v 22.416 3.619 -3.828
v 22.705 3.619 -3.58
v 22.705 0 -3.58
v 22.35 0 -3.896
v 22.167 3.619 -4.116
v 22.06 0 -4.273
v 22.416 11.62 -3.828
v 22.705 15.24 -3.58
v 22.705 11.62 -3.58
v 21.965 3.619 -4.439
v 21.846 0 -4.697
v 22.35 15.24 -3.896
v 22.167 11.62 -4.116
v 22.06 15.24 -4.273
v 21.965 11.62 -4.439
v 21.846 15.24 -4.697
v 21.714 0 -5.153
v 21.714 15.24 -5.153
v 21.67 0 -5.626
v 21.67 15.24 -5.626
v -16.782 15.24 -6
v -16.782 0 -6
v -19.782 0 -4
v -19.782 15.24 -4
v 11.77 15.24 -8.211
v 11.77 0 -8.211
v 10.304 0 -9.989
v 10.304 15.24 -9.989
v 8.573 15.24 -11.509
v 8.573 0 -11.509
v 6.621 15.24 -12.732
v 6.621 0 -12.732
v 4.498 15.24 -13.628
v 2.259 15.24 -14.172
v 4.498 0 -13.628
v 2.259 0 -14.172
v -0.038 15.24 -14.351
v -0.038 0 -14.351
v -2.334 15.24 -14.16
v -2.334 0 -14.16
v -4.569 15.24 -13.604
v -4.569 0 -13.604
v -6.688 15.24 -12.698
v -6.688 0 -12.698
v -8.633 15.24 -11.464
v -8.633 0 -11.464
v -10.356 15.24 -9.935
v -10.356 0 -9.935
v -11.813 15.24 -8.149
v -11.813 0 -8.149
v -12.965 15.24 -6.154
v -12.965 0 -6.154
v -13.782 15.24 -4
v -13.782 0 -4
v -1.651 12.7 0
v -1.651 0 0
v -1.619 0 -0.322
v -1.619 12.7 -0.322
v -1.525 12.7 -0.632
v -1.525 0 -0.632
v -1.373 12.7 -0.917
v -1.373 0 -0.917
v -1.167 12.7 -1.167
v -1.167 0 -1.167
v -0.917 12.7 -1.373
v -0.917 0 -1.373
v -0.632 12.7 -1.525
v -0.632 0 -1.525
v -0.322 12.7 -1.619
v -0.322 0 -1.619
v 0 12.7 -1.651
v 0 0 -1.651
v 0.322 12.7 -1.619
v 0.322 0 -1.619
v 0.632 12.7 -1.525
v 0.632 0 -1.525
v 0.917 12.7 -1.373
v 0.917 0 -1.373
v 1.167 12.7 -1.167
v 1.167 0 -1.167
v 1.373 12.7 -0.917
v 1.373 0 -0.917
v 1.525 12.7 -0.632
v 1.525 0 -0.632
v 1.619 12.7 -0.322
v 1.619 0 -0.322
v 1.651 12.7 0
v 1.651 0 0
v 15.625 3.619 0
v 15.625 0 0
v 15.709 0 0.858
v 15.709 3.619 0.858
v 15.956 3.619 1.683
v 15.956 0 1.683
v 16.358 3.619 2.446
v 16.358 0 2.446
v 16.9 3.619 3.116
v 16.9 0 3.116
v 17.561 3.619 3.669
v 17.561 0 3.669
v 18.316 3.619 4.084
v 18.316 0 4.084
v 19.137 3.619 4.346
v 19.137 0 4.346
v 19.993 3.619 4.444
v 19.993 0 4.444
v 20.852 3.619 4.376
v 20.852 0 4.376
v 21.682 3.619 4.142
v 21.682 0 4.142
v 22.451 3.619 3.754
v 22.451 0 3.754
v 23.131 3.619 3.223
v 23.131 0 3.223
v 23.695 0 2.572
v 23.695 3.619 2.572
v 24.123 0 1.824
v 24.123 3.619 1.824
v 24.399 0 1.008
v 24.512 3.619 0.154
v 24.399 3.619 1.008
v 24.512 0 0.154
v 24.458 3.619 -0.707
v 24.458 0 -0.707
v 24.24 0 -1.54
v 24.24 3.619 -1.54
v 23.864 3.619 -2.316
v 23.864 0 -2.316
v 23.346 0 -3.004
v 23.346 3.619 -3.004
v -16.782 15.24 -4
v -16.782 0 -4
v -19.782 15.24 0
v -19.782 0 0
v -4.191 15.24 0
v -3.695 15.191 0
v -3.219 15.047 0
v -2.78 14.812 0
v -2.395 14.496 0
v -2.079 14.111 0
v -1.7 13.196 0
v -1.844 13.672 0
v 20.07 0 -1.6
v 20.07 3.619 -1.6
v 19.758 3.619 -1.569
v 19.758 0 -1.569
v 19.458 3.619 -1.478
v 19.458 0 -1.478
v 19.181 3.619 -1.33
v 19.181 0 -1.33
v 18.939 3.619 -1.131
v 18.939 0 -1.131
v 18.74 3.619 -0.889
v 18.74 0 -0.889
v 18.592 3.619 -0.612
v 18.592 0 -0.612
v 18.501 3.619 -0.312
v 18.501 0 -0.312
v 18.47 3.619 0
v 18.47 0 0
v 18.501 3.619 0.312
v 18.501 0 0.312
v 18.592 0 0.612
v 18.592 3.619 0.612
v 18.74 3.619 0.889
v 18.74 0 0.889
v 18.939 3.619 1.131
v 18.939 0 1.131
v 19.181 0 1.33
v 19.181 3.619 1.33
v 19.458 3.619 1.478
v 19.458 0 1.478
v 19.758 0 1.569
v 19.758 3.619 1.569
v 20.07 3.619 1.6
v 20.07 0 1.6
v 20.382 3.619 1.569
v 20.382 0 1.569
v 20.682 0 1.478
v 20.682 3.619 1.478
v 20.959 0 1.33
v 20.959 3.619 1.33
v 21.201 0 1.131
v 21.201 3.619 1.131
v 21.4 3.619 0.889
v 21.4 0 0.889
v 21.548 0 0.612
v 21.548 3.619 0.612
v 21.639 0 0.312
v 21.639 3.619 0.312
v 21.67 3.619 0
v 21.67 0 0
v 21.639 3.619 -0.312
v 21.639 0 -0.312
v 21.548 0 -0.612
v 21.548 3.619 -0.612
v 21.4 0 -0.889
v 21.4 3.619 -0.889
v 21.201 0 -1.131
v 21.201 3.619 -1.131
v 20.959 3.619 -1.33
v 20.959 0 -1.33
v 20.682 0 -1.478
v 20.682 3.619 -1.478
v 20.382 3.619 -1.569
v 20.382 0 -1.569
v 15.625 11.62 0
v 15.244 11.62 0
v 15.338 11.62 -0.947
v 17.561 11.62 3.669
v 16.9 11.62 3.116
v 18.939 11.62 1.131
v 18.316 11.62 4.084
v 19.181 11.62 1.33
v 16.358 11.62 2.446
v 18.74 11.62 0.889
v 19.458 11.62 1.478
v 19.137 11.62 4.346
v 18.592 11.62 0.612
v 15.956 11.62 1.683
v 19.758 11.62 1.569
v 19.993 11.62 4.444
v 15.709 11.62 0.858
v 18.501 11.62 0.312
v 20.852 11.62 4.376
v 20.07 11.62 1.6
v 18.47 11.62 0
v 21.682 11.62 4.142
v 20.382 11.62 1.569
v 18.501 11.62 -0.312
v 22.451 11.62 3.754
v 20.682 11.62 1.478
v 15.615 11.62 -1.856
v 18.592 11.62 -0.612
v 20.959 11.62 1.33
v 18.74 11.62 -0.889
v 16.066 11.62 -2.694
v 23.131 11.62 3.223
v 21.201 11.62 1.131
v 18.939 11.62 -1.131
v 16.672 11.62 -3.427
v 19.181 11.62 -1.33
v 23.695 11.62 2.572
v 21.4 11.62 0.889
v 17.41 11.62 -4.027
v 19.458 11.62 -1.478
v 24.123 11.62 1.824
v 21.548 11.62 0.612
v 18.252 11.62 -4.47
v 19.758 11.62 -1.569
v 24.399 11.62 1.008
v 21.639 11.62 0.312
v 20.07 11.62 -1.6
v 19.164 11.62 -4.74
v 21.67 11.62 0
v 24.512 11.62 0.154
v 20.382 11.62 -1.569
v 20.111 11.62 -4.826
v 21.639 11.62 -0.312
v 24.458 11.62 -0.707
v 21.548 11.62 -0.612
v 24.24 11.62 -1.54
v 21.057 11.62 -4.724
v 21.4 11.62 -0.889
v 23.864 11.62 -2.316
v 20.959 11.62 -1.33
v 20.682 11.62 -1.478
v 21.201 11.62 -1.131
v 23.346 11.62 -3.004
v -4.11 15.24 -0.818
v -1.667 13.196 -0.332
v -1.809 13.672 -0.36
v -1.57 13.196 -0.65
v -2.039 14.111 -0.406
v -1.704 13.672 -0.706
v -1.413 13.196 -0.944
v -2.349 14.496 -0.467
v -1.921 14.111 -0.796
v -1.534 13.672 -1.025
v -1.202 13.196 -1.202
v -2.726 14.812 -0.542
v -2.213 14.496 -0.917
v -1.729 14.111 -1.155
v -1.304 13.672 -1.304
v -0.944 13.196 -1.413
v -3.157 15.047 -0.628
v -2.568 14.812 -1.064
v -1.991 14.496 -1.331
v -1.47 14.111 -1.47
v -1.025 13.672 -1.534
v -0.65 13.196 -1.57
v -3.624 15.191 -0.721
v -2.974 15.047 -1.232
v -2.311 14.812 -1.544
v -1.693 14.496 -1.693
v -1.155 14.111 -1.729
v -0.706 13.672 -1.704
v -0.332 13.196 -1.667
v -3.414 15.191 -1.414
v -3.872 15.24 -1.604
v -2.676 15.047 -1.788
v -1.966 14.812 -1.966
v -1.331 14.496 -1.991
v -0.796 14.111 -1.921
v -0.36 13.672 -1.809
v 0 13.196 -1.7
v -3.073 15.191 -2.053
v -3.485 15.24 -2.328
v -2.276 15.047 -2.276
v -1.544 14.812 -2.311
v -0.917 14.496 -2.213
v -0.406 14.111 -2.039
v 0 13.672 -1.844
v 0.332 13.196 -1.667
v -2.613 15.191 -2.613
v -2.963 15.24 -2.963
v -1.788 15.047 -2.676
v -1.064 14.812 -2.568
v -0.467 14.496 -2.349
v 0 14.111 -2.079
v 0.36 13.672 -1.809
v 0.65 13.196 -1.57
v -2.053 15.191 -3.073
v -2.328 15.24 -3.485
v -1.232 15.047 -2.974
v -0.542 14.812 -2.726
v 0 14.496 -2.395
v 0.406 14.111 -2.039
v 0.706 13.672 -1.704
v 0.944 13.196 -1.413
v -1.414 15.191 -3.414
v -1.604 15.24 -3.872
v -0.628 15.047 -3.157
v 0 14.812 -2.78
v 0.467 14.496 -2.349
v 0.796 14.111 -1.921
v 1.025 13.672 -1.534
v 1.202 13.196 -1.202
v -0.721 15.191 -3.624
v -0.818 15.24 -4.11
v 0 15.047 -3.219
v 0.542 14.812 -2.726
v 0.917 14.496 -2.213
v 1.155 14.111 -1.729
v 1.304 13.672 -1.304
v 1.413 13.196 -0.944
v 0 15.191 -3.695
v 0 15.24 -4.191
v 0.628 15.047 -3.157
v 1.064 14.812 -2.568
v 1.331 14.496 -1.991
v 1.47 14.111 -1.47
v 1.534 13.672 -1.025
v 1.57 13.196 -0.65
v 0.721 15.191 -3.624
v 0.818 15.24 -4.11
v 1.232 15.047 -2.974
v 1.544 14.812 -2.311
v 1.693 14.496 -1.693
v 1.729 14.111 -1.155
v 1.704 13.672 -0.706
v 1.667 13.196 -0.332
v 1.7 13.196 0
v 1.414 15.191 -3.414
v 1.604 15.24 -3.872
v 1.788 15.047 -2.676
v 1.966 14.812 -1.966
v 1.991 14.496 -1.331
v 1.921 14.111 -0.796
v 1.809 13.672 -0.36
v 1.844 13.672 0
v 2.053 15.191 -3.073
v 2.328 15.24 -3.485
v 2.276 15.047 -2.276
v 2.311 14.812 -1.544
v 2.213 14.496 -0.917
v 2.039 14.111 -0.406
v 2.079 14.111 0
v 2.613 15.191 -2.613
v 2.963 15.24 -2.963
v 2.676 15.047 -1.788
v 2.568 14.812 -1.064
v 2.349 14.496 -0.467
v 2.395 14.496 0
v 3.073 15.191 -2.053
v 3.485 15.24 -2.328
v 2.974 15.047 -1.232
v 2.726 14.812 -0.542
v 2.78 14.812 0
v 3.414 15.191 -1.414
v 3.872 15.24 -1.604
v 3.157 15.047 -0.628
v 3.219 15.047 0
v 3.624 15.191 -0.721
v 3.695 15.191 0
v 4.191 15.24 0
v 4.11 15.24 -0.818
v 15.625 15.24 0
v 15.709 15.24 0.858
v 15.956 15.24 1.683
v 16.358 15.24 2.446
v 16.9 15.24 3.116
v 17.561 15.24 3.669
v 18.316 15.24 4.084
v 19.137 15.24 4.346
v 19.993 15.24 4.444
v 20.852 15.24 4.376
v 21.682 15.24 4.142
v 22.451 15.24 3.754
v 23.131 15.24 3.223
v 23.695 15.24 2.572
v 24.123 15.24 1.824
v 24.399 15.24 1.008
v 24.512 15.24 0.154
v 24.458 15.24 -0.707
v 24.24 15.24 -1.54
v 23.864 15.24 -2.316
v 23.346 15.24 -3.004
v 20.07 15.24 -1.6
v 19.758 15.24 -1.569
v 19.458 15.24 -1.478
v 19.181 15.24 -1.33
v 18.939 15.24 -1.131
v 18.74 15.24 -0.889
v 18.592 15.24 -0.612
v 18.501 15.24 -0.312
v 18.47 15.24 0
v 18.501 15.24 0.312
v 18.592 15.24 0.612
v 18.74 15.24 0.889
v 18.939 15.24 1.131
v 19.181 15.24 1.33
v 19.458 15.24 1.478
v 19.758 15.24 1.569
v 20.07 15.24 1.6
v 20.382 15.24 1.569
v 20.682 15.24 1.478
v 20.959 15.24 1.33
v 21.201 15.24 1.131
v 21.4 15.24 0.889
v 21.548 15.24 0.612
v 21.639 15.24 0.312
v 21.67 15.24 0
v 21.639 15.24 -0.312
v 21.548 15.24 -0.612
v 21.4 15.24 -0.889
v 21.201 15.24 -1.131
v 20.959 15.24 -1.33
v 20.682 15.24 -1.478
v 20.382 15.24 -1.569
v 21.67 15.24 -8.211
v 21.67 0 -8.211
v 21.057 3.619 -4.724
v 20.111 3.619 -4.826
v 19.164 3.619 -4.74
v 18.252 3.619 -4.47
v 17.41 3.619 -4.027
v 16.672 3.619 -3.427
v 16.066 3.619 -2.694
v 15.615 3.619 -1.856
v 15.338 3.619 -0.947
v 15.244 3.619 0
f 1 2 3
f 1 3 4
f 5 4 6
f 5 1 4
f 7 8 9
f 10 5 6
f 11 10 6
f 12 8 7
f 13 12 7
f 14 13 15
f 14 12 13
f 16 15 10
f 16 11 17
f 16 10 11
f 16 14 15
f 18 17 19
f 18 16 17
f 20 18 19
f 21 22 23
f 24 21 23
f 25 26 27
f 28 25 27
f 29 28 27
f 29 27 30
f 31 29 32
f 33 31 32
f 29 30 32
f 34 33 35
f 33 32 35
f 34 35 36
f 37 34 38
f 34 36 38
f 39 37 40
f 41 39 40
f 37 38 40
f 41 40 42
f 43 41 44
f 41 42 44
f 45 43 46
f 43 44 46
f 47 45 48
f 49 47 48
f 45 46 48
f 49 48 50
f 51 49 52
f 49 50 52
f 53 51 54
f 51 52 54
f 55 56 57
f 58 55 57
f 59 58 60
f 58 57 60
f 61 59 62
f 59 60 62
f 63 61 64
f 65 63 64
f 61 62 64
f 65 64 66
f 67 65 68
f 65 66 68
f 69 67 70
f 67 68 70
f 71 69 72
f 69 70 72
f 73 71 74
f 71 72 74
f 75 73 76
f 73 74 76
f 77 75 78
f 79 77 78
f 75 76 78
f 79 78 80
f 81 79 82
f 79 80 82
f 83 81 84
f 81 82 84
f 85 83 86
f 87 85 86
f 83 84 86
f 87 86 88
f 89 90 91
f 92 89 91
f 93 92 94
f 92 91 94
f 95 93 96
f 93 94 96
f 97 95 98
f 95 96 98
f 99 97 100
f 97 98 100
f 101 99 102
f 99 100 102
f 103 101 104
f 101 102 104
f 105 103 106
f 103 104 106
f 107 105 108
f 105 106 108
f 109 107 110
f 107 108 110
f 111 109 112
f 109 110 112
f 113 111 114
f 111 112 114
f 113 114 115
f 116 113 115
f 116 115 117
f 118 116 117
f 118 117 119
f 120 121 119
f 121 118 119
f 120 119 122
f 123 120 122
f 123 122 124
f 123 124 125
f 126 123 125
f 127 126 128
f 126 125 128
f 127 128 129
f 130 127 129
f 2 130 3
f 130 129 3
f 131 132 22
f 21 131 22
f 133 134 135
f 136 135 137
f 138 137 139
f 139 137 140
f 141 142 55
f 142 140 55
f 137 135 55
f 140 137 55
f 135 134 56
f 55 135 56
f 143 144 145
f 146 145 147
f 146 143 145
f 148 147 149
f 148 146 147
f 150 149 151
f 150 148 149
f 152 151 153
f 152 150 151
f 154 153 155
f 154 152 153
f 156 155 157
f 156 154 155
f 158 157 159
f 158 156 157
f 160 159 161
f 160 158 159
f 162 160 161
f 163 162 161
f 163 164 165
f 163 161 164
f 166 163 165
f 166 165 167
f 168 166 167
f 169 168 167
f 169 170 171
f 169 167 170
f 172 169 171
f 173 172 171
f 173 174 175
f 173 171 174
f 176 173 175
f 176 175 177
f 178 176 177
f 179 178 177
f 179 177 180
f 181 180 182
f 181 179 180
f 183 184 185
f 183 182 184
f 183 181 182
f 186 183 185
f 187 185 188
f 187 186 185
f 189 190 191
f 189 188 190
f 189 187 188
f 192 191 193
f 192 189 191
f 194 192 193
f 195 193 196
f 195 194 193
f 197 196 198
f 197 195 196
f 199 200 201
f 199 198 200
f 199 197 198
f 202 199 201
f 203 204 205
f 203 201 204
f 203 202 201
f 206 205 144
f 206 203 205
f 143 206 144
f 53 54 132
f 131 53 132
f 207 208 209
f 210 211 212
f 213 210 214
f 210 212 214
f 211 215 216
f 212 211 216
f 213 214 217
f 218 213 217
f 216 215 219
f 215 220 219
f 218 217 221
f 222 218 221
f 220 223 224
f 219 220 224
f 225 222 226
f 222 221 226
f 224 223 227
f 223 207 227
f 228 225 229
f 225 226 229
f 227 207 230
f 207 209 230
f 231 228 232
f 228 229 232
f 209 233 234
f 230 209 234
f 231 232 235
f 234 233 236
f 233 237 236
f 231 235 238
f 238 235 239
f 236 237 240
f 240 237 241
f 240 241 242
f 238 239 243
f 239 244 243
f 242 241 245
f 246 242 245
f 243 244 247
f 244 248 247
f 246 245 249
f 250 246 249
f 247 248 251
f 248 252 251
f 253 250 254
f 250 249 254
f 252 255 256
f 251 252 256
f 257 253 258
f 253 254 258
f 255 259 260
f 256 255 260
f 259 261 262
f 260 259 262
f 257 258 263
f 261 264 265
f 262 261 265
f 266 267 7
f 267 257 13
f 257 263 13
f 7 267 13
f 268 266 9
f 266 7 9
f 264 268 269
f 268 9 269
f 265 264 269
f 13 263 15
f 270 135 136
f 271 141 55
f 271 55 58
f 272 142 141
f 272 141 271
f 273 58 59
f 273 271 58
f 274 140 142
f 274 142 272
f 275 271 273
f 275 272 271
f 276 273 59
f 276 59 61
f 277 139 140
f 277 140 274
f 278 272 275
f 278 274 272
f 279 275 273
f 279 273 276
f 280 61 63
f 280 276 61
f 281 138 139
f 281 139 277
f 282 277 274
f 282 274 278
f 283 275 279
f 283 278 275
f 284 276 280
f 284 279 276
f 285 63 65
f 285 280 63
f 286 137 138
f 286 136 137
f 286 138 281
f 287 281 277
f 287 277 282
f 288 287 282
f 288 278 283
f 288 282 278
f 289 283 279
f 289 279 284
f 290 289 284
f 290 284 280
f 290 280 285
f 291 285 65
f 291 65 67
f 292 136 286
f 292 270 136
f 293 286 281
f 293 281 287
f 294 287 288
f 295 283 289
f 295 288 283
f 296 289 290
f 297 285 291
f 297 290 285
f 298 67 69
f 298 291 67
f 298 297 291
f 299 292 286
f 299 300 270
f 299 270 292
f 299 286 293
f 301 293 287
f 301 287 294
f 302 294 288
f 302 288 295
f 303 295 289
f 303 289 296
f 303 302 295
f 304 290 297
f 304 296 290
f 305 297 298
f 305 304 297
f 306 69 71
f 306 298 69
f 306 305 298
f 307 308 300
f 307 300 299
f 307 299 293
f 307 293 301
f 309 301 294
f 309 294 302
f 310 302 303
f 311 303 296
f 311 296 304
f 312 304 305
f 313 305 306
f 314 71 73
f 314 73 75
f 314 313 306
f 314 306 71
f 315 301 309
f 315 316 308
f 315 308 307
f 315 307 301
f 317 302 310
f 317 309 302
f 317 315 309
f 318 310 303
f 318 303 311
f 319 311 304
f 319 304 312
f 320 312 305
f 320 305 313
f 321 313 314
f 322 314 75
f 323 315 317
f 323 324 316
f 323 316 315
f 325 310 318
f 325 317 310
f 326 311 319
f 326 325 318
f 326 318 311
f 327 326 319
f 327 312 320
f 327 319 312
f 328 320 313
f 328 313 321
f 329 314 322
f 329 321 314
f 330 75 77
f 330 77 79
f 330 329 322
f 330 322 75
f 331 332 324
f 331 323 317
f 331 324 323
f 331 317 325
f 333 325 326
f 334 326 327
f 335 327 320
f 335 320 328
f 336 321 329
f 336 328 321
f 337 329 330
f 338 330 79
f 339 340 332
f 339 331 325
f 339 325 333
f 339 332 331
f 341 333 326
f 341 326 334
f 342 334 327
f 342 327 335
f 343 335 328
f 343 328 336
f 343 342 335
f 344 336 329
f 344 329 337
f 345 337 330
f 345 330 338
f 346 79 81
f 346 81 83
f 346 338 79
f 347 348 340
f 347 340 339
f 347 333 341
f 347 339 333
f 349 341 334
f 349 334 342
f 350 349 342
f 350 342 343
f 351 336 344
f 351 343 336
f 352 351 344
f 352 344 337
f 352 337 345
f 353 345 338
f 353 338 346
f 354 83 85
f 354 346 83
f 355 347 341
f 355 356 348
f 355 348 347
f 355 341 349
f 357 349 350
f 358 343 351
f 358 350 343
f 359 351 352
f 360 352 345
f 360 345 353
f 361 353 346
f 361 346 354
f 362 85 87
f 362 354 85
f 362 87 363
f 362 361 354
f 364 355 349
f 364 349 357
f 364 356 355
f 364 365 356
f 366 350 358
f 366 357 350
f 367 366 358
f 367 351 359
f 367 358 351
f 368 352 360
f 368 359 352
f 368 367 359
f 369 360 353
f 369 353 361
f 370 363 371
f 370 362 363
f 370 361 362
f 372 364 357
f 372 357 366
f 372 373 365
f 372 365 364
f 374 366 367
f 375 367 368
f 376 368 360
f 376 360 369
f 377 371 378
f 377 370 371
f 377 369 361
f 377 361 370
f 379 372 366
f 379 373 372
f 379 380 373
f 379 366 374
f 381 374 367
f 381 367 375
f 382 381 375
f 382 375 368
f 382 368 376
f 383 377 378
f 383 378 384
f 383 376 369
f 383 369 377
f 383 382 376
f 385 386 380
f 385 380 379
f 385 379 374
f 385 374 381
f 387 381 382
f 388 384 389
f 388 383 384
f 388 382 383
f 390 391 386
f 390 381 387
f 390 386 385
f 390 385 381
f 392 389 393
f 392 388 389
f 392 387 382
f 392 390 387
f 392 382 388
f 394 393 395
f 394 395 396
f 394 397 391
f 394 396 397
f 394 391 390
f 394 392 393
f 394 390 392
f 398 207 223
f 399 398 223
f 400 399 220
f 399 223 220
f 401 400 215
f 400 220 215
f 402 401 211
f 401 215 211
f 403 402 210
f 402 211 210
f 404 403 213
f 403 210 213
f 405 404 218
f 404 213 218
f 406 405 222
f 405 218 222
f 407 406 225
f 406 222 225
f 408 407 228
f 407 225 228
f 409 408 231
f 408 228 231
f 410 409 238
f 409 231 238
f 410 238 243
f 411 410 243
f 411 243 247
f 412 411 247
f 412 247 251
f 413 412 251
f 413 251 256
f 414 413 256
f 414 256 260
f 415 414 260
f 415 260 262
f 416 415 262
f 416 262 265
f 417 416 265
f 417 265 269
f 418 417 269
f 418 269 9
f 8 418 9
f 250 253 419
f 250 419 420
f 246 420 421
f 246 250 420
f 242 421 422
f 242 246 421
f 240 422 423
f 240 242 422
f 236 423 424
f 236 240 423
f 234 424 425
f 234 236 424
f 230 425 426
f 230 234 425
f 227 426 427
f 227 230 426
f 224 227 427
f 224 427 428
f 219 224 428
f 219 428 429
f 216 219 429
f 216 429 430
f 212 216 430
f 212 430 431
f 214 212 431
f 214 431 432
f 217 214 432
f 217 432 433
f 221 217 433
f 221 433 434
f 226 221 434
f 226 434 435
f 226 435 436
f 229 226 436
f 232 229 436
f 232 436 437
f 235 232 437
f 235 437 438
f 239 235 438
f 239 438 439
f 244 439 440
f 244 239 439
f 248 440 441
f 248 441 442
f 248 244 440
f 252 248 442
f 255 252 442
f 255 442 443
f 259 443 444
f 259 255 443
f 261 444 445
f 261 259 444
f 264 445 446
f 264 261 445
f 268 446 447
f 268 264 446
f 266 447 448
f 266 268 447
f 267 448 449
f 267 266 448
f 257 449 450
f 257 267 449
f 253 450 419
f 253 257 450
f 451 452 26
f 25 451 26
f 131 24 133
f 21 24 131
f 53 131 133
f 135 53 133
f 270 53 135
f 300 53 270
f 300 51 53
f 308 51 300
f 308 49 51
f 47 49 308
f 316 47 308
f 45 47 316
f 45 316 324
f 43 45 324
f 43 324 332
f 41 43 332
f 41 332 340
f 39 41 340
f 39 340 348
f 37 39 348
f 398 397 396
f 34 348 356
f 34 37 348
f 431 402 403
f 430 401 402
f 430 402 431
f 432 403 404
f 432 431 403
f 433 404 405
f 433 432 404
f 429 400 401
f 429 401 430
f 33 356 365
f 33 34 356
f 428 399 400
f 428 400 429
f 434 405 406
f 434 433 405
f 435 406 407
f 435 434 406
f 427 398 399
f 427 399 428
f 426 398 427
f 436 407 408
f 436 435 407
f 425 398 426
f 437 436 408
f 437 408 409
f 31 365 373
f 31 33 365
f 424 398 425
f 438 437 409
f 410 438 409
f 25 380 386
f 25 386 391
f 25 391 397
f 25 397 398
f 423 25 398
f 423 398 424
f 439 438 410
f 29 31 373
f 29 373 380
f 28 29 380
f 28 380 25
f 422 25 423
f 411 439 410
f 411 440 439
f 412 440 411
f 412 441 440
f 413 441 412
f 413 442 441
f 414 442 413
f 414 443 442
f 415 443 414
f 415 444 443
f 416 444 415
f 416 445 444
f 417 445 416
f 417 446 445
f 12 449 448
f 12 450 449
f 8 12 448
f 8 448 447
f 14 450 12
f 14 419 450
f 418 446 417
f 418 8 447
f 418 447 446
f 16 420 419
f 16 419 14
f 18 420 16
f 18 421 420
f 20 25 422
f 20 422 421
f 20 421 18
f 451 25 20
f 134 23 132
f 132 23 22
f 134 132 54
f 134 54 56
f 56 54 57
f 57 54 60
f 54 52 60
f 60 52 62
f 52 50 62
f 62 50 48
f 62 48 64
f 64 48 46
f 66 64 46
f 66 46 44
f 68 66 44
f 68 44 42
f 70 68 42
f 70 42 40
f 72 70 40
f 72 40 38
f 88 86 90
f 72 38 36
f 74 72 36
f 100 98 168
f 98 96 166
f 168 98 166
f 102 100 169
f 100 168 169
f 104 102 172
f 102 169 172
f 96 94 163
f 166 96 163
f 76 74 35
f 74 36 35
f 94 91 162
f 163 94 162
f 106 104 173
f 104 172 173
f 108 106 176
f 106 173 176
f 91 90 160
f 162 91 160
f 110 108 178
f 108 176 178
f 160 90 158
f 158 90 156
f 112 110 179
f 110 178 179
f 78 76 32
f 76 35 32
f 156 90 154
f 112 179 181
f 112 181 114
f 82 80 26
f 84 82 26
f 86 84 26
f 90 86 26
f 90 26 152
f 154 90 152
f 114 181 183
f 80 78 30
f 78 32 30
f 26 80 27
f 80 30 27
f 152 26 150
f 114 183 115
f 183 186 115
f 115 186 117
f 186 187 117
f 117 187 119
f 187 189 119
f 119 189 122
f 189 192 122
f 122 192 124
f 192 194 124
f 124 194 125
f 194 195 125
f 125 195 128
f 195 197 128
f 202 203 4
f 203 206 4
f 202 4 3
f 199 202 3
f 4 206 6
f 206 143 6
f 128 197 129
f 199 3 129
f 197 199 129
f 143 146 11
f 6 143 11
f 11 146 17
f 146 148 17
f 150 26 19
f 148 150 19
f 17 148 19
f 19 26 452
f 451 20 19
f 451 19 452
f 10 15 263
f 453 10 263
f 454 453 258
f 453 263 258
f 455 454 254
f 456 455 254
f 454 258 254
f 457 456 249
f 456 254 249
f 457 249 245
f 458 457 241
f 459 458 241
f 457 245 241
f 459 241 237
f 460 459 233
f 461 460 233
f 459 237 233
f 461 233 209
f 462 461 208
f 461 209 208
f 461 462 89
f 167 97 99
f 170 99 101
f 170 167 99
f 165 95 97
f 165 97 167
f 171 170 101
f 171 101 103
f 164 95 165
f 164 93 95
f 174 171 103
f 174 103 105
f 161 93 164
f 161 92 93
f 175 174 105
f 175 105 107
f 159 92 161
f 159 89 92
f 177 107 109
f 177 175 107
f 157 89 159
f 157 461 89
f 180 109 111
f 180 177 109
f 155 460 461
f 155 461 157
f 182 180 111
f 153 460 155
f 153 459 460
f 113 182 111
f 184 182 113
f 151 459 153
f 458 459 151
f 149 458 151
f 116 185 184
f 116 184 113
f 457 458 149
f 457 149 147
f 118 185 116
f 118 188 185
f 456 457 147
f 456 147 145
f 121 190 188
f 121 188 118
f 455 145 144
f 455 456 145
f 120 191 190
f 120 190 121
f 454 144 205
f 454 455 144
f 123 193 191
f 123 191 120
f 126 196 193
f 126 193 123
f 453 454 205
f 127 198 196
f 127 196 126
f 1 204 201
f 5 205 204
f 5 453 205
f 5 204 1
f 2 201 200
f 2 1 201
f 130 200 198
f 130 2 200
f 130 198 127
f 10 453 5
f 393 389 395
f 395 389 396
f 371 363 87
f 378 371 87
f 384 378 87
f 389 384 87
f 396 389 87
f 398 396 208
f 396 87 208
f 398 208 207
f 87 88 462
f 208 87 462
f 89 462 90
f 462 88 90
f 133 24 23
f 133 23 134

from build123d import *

# Parameters (mm, degrees)
SKETCH1_R           = 1.6000000000000016
BOSS_EXTRUDE1_DEPTH = 15.239999999999998
SKETCH2_R           = 4.8260000000000005
CUT_EXTRUDE1_DEPTH  = 4.0005
FILLET2_R           = 2.54
FILLET3_R           = 2.54


with BuildPart() as part:
    # Sketch1 → Boss-Extrude1 (new body)
    with BuildSketch(Plane(origin=(0, 0, 0), x_dir=(1, 0, 0), z_dir=(0, 1, 0))):
        with BuildLine():
            Line((-19.782278512640783, -6.1e-16), (-13.782278512640788, 0))
            Line((-13.782278512640788, 0), (-1.6509999999999998, 0))
            ThreePointArc((-1.651, -4.2e-16), (-3.8e-16, 1.6509999999999998), (1.6509999999999996, 0))
            Line((1.6509999999999998, 0), (15.624999999999998, -1.4e-16))
            ThreePointArc((15.625, -1.4e-16), (22.584560100693558, -3.665380266766327), (21.670000000000005, 4.147050156436503))
            Line((21.67, 4.147050156436504), (21.67, 8.211050156436503))
            Line((21.67, 8.211050156436503), (11.769870701434405, 8.211050156436503))
            ThreePointArc((11.769870701434405, 8.211050156436505), (6.637560553583663, 12.723756949011177), (2.2e-16, 14.351))
            ThreePointArc((8.9e-16, 14.350999999999999), (-8.618213300911037, 11.475086078108522), (-13.782278512640787, 4.000000000000001))
            Line((-13.782278512640788, 4), (-16.782278512640787, 4))
            Line((-16.782278512640787, 4), (-16.782278512640787, 6))
            Line((-16.782278512640787, 6), (-19.782278512640783, 4))
            Line((-19.782278512640783, 4), (-19.782278512640783, -6.1e-16))
        make_face()
        with Locations(Location((20.07, 8e-16, 0), (0, 0, 90))):
            Circle(SKETCH1_R, mode=Mode.SUBTRACT)
    extrude(amount=BOSS_EXTRUDE1_DEPTH)

    # Sketch2 → Cut-Extrude1 (cut, symmetric)
    with BuildSketch(Plane(origin=(0, 7.619999999999999, 0), x_dir=(1, 0, 0), z_dir=(0, 1, 0))):
        with Locations((20.07, 8e-16)):
            Circle(SKETCH2_R)
    extrude(amount=CUT_EXTRUDE1_DEPTH, both=True, mode=Mode.SUBTRACT)

    # Fillet2
    fillet2_edges = [part.edges().sort_by_distance(p)[0] for p in [
        (-3.8e-16, 15.239999999999998, -1.6509999999999998),
    ]]
    fillet(fillet2_edges, radius=FILLET2_R)

    # Fillet3
    fillet3_edges = [part.edges().sort_by_distance(p)[0] for p in [
        (21.67, 1.8097499999999997, -4.147050156436503),
    ]]
    fillet(fillet3_edges, radius=FILLET3_R)


solid = part.part
